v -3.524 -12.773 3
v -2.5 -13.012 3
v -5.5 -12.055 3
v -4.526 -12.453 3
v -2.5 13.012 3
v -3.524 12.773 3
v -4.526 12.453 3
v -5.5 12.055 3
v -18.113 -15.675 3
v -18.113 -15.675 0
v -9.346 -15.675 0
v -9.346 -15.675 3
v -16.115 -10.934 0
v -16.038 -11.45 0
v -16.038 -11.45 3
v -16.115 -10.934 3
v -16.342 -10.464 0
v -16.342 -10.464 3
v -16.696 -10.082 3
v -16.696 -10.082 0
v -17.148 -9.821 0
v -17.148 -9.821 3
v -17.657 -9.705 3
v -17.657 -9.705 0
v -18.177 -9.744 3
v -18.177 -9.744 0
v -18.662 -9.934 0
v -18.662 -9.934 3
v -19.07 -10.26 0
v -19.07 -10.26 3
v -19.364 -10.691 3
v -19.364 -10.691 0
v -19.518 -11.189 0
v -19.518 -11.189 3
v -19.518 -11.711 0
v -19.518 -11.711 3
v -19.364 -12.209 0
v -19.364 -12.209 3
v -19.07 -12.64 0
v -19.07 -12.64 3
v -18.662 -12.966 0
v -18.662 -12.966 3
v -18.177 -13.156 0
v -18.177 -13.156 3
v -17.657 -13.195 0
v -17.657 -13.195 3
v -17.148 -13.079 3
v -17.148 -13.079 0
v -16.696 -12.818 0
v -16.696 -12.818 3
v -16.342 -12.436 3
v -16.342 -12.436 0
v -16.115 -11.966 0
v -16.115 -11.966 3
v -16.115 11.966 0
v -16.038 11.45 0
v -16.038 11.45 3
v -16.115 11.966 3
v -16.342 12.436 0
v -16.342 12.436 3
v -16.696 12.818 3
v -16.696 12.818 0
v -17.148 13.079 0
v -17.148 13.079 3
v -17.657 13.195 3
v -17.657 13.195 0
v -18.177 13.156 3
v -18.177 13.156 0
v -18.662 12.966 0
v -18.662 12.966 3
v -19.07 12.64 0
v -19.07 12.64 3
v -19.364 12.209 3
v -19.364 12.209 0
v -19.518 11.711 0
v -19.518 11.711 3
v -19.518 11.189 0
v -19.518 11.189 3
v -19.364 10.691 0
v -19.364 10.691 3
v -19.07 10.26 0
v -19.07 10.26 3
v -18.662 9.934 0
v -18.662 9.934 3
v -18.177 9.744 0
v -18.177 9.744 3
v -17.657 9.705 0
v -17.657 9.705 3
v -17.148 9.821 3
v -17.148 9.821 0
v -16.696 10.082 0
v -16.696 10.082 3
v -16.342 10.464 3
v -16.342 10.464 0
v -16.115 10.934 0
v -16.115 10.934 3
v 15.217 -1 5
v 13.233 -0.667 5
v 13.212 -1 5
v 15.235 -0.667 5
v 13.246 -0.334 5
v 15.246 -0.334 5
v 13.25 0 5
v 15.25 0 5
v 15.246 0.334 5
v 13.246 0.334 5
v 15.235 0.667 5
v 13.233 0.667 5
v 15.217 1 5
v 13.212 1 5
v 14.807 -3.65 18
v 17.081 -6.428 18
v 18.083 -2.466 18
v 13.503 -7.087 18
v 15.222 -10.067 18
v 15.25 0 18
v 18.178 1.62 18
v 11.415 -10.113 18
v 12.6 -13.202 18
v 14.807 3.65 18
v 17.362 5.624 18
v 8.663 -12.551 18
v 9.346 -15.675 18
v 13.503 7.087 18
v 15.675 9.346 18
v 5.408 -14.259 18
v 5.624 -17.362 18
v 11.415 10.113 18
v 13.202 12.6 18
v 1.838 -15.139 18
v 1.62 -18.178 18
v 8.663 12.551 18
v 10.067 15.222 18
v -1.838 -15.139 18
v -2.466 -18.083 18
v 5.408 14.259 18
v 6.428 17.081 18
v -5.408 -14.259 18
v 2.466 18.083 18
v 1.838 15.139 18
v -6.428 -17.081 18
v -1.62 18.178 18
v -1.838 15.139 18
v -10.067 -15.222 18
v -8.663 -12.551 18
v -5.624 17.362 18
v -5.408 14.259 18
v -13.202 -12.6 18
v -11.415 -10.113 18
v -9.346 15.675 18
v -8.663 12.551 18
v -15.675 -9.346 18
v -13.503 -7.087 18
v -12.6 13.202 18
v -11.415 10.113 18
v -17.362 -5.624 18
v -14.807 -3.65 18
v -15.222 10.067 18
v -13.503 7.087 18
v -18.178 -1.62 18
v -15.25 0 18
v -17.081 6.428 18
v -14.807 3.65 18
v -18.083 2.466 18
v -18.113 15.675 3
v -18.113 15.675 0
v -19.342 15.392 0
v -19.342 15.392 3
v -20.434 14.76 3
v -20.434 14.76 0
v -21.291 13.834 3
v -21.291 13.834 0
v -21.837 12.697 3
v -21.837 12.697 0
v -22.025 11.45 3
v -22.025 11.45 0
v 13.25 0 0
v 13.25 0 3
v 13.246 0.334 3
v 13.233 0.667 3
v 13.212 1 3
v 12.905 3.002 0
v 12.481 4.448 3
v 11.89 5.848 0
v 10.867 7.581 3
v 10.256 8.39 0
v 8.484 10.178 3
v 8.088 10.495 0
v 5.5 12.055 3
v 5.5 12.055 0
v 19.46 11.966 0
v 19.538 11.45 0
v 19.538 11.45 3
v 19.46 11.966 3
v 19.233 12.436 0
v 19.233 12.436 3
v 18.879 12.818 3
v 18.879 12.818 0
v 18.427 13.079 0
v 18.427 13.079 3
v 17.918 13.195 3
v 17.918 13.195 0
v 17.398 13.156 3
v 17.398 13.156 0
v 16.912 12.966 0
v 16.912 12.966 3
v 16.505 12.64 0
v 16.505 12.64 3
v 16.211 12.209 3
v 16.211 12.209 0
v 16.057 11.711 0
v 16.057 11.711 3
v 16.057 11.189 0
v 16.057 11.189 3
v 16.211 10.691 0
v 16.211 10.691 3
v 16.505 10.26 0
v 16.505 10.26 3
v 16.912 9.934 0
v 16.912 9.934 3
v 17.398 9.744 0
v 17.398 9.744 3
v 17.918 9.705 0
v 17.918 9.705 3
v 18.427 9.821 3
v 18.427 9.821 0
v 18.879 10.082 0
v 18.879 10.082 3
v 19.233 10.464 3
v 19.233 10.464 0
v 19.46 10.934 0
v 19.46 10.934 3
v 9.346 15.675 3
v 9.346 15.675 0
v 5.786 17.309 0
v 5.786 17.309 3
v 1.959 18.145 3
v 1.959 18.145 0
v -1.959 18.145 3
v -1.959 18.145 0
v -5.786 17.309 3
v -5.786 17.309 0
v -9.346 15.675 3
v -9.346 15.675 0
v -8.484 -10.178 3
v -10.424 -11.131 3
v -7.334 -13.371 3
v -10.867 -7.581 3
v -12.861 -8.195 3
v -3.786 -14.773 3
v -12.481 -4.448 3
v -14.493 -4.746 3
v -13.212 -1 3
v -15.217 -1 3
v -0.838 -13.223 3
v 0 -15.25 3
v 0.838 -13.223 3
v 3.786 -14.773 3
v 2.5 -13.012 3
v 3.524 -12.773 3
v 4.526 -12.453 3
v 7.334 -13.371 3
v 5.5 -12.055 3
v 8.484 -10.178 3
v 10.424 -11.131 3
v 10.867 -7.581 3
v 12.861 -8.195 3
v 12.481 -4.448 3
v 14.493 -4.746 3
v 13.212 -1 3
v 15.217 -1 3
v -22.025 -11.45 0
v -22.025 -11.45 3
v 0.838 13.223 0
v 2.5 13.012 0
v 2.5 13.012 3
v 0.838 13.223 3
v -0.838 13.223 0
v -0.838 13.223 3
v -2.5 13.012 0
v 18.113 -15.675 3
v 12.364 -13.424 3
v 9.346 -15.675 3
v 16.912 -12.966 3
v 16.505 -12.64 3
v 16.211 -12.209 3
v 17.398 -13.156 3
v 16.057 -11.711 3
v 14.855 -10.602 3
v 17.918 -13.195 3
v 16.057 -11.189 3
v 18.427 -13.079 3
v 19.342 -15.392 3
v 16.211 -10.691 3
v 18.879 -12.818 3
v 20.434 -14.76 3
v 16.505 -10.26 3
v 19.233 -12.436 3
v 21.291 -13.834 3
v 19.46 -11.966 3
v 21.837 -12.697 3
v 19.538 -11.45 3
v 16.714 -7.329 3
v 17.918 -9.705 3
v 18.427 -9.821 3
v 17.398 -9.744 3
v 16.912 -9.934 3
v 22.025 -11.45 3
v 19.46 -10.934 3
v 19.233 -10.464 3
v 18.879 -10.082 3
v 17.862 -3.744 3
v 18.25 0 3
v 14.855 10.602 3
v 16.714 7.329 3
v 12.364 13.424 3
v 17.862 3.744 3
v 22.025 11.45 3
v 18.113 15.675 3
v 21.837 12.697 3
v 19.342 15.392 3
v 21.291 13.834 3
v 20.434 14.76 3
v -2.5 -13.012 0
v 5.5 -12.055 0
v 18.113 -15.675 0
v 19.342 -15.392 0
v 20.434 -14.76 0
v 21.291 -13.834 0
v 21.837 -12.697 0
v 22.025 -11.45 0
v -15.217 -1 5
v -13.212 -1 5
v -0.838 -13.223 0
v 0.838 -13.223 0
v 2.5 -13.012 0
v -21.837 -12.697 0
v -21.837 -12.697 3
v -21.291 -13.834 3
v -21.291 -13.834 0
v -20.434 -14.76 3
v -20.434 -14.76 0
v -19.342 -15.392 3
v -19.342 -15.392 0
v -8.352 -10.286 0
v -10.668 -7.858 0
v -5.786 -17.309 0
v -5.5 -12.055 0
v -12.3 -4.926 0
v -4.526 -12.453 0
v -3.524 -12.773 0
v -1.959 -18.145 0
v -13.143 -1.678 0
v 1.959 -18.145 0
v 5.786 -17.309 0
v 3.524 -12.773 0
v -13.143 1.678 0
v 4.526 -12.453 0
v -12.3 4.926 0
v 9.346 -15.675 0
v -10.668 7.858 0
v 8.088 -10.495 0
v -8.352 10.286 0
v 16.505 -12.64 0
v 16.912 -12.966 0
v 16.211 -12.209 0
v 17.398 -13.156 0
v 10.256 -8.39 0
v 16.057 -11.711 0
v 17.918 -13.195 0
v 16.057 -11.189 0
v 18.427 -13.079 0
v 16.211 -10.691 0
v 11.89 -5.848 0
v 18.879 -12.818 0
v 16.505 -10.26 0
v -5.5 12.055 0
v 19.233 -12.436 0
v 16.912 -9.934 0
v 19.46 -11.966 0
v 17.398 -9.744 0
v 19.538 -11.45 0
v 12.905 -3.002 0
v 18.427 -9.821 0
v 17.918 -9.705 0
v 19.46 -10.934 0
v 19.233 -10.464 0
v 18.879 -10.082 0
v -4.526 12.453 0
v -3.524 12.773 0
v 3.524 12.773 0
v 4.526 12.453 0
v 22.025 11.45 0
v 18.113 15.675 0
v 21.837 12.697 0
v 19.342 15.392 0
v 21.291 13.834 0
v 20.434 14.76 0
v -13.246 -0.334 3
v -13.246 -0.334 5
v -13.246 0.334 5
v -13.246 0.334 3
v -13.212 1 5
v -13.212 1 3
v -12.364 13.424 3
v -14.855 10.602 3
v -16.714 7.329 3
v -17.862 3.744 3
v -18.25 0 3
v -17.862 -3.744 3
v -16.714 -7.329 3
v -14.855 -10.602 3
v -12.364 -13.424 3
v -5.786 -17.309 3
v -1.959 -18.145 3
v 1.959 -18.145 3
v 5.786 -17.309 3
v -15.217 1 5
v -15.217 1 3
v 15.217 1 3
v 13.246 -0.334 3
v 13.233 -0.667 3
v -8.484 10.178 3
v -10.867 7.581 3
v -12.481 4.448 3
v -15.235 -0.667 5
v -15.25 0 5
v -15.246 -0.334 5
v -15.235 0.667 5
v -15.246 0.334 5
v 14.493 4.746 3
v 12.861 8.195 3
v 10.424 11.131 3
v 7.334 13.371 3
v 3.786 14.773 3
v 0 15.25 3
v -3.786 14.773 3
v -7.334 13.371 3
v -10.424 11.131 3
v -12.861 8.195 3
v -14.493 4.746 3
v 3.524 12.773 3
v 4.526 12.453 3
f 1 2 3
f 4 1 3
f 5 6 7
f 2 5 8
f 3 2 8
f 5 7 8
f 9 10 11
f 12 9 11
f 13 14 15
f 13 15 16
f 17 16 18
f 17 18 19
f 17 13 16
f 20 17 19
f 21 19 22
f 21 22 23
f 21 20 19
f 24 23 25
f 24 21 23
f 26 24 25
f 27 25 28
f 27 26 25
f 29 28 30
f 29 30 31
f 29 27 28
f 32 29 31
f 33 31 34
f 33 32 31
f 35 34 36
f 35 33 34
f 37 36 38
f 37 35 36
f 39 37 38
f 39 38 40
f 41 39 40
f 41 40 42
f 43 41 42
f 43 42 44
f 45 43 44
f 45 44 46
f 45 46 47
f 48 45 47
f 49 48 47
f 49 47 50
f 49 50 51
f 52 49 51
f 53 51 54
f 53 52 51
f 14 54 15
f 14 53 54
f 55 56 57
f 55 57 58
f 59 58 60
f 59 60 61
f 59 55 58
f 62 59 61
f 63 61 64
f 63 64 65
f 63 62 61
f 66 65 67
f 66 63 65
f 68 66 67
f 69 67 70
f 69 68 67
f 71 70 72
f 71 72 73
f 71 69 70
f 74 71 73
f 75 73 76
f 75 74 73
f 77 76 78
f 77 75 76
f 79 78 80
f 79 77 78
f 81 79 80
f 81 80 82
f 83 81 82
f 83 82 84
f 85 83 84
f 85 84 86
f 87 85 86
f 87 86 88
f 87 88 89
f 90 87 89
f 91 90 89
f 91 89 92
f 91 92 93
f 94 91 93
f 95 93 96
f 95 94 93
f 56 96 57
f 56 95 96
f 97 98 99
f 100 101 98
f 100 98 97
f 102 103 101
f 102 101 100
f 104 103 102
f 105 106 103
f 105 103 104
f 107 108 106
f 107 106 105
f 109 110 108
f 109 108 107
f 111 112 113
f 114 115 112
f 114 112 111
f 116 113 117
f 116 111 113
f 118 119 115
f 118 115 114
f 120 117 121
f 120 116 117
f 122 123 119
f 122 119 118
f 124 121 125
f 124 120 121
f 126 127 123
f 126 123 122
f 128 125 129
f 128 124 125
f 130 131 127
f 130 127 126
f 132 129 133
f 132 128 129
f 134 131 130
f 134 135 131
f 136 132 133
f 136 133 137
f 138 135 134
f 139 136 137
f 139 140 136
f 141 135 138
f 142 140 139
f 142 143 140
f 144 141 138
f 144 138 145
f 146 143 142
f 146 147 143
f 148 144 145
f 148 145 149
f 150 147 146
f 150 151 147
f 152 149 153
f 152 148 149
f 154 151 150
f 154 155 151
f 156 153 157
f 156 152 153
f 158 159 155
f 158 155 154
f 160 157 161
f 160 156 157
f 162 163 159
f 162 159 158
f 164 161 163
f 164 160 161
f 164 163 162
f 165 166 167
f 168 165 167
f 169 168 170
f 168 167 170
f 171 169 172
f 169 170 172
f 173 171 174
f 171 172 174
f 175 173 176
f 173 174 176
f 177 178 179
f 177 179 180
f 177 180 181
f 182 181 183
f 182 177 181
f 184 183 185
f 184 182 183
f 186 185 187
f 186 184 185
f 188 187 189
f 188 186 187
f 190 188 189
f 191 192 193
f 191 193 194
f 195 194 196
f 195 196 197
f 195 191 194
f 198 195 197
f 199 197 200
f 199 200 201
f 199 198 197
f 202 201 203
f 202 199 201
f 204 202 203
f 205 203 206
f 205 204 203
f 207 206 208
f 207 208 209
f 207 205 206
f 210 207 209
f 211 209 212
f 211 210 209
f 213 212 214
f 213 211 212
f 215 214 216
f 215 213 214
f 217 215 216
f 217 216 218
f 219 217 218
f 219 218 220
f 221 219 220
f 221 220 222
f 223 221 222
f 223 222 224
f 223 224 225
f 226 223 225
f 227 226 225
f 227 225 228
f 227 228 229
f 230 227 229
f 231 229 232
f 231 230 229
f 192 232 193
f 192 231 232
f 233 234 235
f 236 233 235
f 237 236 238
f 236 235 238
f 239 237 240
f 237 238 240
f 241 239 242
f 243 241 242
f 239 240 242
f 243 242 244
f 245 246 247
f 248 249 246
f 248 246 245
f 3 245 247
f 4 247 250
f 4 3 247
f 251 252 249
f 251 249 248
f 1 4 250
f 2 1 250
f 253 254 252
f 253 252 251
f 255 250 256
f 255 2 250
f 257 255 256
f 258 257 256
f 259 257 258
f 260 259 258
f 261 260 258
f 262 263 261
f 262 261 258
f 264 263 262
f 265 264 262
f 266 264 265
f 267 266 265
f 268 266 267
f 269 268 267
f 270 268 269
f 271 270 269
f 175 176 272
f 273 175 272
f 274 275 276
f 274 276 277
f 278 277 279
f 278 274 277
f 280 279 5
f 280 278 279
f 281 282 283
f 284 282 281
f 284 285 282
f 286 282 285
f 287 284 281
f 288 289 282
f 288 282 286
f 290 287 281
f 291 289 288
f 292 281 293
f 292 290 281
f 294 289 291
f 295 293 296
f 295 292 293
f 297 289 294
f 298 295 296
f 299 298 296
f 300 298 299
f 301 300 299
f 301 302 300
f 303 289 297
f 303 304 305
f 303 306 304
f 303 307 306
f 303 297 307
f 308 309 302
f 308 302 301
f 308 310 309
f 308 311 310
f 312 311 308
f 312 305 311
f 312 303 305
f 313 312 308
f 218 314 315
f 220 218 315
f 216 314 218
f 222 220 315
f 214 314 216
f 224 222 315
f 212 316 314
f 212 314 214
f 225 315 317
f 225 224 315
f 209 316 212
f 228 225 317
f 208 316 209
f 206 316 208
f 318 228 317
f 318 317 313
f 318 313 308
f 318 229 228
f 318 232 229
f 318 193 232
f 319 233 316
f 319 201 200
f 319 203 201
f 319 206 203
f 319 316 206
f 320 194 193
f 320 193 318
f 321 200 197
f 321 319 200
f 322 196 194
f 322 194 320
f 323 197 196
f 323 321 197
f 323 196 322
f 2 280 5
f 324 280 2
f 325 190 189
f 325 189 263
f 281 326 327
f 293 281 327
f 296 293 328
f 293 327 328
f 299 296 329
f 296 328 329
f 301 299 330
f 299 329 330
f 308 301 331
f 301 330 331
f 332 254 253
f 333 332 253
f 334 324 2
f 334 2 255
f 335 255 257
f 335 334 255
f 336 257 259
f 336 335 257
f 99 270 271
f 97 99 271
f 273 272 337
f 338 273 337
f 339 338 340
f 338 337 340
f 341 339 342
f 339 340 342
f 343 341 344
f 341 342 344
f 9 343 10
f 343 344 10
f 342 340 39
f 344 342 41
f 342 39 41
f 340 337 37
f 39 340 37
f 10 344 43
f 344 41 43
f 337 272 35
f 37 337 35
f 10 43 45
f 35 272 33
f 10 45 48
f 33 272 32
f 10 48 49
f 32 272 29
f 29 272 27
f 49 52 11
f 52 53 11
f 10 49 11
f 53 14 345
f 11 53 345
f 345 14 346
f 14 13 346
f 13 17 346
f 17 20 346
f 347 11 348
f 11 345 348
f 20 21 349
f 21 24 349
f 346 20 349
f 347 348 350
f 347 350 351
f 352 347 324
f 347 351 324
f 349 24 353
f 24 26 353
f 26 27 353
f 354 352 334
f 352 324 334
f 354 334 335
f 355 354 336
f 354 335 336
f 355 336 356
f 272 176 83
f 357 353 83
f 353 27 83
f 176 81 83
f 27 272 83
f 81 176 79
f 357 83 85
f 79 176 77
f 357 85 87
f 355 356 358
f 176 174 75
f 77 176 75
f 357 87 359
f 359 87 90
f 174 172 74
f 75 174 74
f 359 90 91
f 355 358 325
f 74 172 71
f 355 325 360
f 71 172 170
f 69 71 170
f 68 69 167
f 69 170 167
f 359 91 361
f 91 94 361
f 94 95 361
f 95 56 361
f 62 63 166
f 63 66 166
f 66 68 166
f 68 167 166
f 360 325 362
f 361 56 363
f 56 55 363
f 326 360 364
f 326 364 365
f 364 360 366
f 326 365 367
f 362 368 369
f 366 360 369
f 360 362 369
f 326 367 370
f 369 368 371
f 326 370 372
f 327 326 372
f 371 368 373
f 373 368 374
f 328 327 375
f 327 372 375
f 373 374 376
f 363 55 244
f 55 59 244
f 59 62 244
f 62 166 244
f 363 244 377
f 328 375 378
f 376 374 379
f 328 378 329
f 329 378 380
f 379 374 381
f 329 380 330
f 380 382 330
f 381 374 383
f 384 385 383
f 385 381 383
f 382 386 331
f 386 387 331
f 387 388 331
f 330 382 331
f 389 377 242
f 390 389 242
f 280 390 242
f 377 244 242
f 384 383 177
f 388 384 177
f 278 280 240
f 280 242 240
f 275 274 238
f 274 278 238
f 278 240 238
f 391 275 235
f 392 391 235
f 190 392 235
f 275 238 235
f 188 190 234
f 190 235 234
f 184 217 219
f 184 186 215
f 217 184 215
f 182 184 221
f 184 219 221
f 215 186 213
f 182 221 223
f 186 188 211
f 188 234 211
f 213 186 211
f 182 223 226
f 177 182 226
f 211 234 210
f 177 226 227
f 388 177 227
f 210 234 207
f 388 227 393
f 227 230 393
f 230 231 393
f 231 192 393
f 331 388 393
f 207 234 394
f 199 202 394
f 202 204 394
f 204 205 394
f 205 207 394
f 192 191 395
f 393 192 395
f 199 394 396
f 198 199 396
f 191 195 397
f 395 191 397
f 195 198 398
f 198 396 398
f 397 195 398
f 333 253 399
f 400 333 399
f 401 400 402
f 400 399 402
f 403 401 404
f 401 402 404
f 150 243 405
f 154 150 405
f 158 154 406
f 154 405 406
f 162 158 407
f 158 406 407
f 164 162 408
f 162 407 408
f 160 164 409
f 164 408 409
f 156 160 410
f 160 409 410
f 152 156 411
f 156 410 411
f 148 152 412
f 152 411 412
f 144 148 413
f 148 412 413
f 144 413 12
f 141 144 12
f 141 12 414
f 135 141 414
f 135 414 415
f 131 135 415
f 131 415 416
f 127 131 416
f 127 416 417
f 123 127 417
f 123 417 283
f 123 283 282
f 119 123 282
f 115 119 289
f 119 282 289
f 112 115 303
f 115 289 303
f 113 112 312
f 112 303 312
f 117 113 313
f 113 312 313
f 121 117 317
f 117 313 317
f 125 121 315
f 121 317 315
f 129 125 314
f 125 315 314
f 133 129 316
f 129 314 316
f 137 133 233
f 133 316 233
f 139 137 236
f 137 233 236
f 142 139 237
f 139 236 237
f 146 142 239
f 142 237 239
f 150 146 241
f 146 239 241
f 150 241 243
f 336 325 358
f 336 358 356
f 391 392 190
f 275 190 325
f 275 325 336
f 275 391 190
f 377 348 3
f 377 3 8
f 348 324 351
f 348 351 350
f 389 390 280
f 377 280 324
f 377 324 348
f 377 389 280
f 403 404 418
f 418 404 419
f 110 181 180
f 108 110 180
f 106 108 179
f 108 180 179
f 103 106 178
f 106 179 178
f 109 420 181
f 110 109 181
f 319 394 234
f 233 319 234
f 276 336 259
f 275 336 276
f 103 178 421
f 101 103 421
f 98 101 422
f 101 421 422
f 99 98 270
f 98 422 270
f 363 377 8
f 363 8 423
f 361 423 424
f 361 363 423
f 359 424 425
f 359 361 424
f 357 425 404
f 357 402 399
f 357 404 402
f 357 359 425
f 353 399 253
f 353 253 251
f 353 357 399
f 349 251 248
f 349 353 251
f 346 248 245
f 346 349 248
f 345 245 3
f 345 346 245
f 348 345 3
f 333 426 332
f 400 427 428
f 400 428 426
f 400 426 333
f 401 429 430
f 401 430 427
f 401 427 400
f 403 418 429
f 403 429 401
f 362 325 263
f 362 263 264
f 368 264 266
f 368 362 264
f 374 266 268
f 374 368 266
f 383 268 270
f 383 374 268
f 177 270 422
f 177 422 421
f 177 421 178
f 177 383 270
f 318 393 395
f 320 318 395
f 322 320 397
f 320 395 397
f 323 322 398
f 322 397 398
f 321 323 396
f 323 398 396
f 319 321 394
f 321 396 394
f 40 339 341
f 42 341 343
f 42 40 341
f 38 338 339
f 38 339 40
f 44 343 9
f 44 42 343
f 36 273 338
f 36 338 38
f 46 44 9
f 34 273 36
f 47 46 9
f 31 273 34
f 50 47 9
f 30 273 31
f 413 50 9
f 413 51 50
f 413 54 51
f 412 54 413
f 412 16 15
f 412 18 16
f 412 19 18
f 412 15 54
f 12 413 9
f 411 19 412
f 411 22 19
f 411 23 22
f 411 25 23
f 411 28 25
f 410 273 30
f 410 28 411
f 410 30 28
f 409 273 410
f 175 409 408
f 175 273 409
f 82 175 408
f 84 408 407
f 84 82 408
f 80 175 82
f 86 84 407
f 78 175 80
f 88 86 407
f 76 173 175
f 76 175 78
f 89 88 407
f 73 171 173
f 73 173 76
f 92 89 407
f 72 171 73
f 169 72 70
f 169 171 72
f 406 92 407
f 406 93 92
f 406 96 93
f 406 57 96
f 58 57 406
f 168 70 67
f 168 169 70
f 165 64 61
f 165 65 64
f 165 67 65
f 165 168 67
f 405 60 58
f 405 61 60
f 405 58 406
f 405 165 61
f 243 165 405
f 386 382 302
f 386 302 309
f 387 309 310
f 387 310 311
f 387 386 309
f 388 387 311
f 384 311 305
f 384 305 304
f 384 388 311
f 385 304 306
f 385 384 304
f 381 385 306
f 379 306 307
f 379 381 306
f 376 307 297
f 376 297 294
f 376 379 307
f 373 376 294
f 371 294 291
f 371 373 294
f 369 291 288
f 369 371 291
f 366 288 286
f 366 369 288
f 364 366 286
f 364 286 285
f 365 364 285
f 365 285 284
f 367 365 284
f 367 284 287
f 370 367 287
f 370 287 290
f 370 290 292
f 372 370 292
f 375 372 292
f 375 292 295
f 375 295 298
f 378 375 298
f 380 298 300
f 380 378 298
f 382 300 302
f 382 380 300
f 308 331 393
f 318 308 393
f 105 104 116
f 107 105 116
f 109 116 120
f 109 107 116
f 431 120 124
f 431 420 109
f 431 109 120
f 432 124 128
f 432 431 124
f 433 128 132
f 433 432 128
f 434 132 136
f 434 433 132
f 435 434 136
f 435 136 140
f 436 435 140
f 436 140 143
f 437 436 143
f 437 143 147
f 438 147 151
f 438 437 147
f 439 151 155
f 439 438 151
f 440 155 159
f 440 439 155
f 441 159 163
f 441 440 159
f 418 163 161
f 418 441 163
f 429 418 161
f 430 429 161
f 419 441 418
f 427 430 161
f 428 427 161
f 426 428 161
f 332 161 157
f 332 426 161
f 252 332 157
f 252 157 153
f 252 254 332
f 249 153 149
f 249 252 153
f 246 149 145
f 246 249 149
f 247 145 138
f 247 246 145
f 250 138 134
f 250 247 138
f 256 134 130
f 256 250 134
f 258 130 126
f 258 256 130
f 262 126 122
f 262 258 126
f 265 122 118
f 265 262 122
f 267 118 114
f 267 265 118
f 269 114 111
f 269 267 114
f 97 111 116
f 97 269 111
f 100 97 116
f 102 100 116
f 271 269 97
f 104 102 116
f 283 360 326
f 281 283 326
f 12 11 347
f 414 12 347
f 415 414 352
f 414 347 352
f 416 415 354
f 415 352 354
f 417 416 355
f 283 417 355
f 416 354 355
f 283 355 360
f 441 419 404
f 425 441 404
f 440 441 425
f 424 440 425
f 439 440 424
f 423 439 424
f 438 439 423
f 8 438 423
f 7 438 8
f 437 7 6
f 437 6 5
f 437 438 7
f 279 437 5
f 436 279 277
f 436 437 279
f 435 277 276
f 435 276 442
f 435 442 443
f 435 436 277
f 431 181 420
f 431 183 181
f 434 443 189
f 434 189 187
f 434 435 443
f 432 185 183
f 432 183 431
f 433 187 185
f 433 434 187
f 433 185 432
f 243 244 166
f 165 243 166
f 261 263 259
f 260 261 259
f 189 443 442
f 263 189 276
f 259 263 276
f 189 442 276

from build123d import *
from build123d.topology import SkipClean

# Parameters (mm, degrees)
SKETCH1_R                = 1.4
SKETCH1_R_2              = 13.25
BOSS_EXTRUDE1_DEPTH      = 3
SKETCH3_R                = 18.25
SKETCH3_R_2              = 15.25
BOSS_EXTRUDE2_DEPTH      = 15
BOSS_EXTRUDE4_DEPTH      = 2
BOSS_EXTRUDE5_DEPTH      = 3
CUT_EXTRUDE1_START       = -3
CUT_EXTRUDE1_OUTLINE_R   = 1.75
CUT_EXTRUDE1_OUTLINE_R_2 = 1.4
CUT_EXTRUDE1_DEPTH       = 3


# Read off the part's stored shape, not the designer's step: Cut-Extrude1
with BuildPart() as part:
    # Sketch1 → Boss-Extrude1 (new body)
    with BuildSketch(Plane.XY):
        with BuildLine():
            ThreePointArc((22.025, 11.45), (20.896729165, 14.329079757), (18.112740296, 15.675))
            Line((18.112740296, 15.675), (9.346489983, 15.675))
            ThreePointArc((9.346489983, 15.675), (0, 18.25), (-9.346489983, 15.675))
            Line((-9.346489983, 15.675), (-18.112740296, 15.675))
            ThreePointArc((-18.112740296, 15.675), (-20.896729165, 14.329079757), (-22.025, 11.45))
            Line((-22.025, 11.45), (-22.025, -11.45))
            ThreePointArc((-22.025, -11.45), (-20.896729165, -14.329079757), (-18.112740296, -15.675))
            Line((-18.112740296, -15.675), (-9.346489983, -15.675))
            ThreePointArc((-9.346489983, -15.675), (0, -18.25), (9.346489983, -15.675))
            Line((9.346489983, -15.675), (18.112740296, -15.675))
            ThreePointArc((18.112740296, -15.675), (20.896729165, -14.329079757), (22.025, -11.45))
            Line((22.025, -11.45), (22.025, 11.45))
        make_face()
        with Locations((17.7875, -11.45)):
            Circle(SKETCH1_R, mode=Mode.SUBTRACT)
        with Locations((17.7875, 11.45)):
            Circle(SKETCH1_R, mode=Mode.SUBTRACT)
        with Locations((-17.7875, 11.45)):
            Circle(SKETCH1_R, mode=Mode.SUBTRACT)
        with Locations((-17.7875, -11.45)):
            Circle(SKETCH1_R, mode=Mode.SUBTRACT)
        Circle(SKETCH1_R_2, mode=Mode.SUBTRACT)
    extrude(amount=BOSS_EXTRUDE1_DEPTH)

    # Sketch3 → Boss-Extrude2 (add)
    with BuildSketch(Plane.XY.offset(3)):
        with Locations(Location((0, 0, 0), (0, 0, 120.806241835))):
            Circle(SKETCH3_R)
        Circle(SKETCH3_R_2, mode=Mode.SUBTRACT)
    extrude(amount=BOSS_EXTRUDE2_DEPTH)

    # Sketch5 → Boss-Extrude4 (add)
    with SkipClean():  # the faces are left unmerged after this step: merging them gives an invalid solid
        with BuildSketch(Plane.XY.offset(3)):
            with BuildLine():
                ThreePointArc((-15.25, -5.3e-08), (-15.241792239, -0.500269278), (-15.217177794, -1))
                Line((-15.217177794, -1), (-13.212210262, -1))
                ThreePointArc((-13.212210262, -1), (-13.25, 0), (-13.212210262, 1))
                Line((-13.212210262, 1), (-15.217177794, 1))
                ThreePointArc((-15.217177794, 1), (-15.24179224, 0.500269225), (-15.25, -5.3e-08))
            make_face()
            with BuildLine():
                Line((13.212210262, -1), (15.217177794, -1))
                ThreePointArc((15.217177794, -1), (15.24179224, -0.500269252), (15.25, 0))
                ThreePointArc((15.25, 0), (15.24179224, 0.500269252), (15.217177794, 1))
                Line((15.217177794, 1), (13.212210262, 1))
                ThreePointArc((13.212210262, 1), (13.240549195, 0.500356889), (13.25, 0))
                ThreePointArc((13.25, 0), (13.240549195, -0.500356889), (13.212210262, -1))
            make_face()
        extrude(amount=BOSS_EXTRUDE4_DEPTH)

    # Sketch6 → Boss-Extrude5 (add)
    with SkipClean():  # the faces are left unmerged after this step: merging them gives an invalid solid
        with BuildSketch(Plane(origin=(0, 0, 0), x_dir=(-1, 0, 0), z_dir=(0, 0, -1))):
            with BuildLine():
                ThreePointArc((-5.5, -12.054563451), (-4.028545362, -12.622730381), (-2.5, -13.01201368))
                Line((-2.5, -13.01201368), (-2.5, 13.01201368))
                ThreePointArc((-2.5, 13.01201368), (-4.028545362, 12.622730381), (-5.5, 12.054563451))
                Line((-5.5, 12.054563451), (-5.5, -12.054563451))
            make_face()
            with BuildLine():
                Line((2.5, 13.01201368), (2.5, -13.01201368))
                ThreePointArc((2.5, -13.01201368), (4.028545362, -12.622730381), (5.5, -12.054563451))
                Line((5.5, -12.054563451), (5.5, 12.054563451))
                ThreePointArc((5.5, 12.054563451), (4.028545362, 12.622730381), (2.5, 13.01201368))
            make_face()
        extrude(amount=-BOSS_EXTRUDE5_DEPTH)

    # Cut-Extrude1 outline → Cut-Extrude1 (cut)
    # profile 1 of 4: a face of its own
    with SkipClean():  # the faces are left unmerged after this step: merging them gives an invalid solid
        with BuildSketch(Plane.XY.offset(3).offset(CUT_EXTRUDE1_START)):
            with Locations((-17.7875, 11.45)):
                Circle(CUT_EXTRUDE1_OUTLINE_R)
            with Locations((-17.7875, 11.45)):
                Circle(CUT_EXTRUDE1_OUTLINE_R_2, mode=Mode.SUBTRACT)
        # profile 2 of 4: a face of its own
        with BuildSketch(Plane.XY.offset(3).offset(CUT_EXTRUDE1_START)):
            with Locations((-17.7875, -11.45)):
                Circle(CUT_EXTRUDE1_OUTLINE_R)
            with Locations((-17.7875, -11.45)):
                Circle(CUT_EXTRUDE1_OUTLINE_R_2, mode=Mode.SUBTRACT)
        # profile 3 of 4: a face of its own
        with BuildSketch(Plane.XY.offset(3).offset(CUT_EXTRUDE1_START)):
            with Locations((17.7875, -11.45)):
                Circle(CUT_EXTRUDE1_OUTLINE_R)
            with Locations((17.7875, -11.45)):
                Circle(CUT_EXTRUDE1_OUTLINE_R_2, mode=Mode.SUBTRACT)
        # profile 4 of 4: a face of its own
        with BuildSketch(Plane.XY.offset(3).offset(CUT_EXTRUDE1_START)):
            with Locations((17.7875, 11.45)):
                Circle(CUT_EXTRUDE1_OUTLINE_R)
            with Locations((17.7875, 11.45)):
                Circle(CUT_EXTRUDE1_OUTLINE_R_2, mode=Mode.SUBTRACT)
        extrude(amount=CUT_EXTRUDE1_DEPTH, mode=Mode.SUBTRACT)


solid = part.part
